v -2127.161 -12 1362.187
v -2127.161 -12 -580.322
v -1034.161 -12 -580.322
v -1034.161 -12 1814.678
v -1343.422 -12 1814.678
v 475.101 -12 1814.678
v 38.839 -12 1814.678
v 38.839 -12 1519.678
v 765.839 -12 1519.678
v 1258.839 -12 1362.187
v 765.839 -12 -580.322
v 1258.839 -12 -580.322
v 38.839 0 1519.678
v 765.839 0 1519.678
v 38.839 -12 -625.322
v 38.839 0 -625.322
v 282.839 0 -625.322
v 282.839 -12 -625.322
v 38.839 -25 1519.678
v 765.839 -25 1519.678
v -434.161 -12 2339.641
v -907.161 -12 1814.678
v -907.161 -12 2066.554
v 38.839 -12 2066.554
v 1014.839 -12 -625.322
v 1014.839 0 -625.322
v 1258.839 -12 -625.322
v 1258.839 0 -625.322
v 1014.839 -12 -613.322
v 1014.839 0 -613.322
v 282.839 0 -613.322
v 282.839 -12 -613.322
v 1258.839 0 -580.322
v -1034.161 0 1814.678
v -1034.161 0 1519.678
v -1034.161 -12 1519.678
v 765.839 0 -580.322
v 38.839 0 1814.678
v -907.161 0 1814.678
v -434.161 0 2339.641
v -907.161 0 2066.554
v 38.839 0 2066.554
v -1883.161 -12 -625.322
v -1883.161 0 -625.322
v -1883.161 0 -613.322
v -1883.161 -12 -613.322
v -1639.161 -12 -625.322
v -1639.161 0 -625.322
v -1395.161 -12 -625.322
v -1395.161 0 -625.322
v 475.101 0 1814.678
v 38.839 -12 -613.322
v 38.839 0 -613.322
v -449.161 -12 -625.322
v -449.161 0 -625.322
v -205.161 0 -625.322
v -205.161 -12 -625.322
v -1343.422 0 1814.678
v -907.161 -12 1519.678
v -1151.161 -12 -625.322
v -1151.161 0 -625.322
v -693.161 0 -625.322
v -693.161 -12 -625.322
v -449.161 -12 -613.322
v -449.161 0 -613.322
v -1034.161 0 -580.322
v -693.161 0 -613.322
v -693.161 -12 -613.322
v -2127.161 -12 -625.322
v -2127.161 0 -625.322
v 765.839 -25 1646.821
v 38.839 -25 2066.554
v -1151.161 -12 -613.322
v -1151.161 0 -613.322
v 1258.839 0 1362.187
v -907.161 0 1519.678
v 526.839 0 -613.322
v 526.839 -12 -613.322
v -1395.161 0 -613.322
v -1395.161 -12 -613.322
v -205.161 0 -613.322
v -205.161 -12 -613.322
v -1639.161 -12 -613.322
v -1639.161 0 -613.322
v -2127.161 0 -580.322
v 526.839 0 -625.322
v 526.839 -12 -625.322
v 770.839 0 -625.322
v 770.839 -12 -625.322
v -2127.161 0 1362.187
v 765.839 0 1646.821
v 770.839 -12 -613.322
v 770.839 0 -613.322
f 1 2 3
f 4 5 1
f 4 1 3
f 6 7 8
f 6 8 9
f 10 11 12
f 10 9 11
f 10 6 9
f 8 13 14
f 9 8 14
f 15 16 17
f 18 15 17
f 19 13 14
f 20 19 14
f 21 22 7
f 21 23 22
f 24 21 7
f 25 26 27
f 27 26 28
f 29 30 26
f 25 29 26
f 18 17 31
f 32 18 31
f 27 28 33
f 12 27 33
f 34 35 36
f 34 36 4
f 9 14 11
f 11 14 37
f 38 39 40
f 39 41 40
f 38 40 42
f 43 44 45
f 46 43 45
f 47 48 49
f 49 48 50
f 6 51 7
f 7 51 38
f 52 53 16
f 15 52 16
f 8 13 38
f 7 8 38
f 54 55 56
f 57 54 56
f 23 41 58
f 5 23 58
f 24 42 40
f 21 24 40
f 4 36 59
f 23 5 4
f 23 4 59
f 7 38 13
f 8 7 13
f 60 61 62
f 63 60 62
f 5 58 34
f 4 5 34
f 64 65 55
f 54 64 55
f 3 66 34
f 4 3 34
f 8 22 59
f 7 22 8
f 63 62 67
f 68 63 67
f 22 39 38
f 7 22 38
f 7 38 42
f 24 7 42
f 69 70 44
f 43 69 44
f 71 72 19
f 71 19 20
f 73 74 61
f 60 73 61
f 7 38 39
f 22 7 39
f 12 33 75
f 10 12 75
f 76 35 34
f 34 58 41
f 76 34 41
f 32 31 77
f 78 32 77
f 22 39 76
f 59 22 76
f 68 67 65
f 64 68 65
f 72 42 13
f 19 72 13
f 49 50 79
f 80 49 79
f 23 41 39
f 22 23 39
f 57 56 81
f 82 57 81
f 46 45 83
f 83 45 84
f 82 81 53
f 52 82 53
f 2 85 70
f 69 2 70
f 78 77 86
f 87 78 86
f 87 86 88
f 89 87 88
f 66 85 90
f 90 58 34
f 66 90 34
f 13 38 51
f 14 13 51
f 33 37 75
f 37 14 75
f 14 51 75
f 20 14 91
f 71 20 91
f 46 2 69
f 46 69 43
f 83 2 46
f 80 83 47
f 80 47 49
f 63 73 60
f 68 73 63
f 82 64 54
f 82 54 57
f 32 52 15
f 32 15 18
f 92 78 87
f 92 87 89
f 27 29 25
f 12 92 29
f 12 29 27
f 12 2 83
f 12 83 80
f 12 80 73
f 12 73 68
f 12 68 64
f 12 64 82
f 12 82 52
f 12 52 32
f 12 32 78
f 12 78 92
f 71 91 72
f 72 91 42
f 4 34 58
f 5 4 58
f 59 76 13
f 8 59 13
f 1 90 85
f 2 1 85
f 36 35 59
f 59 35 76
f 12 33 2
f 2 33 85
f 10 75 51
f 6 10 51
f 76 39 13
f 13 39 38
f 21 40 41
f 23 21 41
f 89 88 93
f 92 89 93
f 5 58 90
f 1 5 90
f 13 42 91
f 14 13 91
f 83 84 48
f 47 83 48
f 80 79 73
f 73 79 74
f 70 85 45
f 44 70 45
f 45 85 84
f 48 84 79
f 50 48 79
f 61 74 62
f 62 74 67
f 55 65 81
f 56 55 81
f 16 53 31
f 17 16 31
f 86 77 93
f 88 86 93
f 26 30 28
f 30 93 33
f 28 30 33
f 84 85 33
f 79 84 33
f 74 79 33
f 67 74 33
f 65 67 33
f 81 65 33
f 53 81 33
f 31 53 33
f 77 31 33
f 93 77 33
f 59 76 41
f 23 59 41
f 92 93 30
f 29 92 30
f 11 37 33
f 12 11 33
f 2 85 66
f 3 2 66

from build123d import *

# Parameters (mm, degrees)
F1_DEPTH = 12
F2_DEPTH = 12
F3_DEPTH = 12
F4_DEPTH = 12
F0_W     = 127
F0_H     = 295
F5_DEPTH = 12
F6_DEPTH = 25
F7_DEPTH = 12


with BuildPart() as f1:
    # F0 (on Front) → F1 (new body)
    with BuildSketch(Plane.XZ):
        Polygon((-2127.1608864989, -580.3215209696), (-1034.1608864989, -580.3215209696), (-1034.1608864989, 1519.6784790304), (-1034.1608864989, 1814.6784790304), (-1343.4224964989, 1814.6784790304), (-2127.1608864989, 1362.1869085897), align=None)
    extrude(amount=F1_DEPTH)


with BuildPart() as f2:
    # F0 (on Front) → F2 (new body)
    with BuildSketch(Plane.XZ):
        Polygon((765.8391135011, 1519.6784790304), (765.8391135011, -580.3215209696), (1258.8391135011, -580.3215209696), (1258.8391135011, 1362.1869085897), (765.8391135011, 1646.8205913001), align=None)
        Polygon((38.8391135011, 1814.6784790304), (38.8391135011, 1519.6784790304), (765.8391135011, 1519.6784790304), (765.8391135011, 1646.8205913001), (475.1007235011, 1814.6784790304), align=None)
    extrude(amount=F2_DEPTH)


with BuildPart() as f3:
    # F0 (on Front) → F3 (new body)
    with BuildSketch(Plane.XZ):
        Polygon((-907.1608864989, 1814.6784790304), (38.8391135011, 1814.6784790304), (38.8391135011, 2066.554237001), (-434.1608864989, 2339.6409143277), (-907.1608864989, 2066.554237001), align=None)
    extrude(amount=F3_DEPTH)


with BuildPart() as f4:
    # F0 (on Front) → F4 (new body)
    with BuildSketch(Plane.XZ):
        Polygon((-434.1608864989, 1519.6784790304), (38.8391135011, 1519.6784790304), (38.8391135011, 1814.6784790304), (-907.1608864989, 1814.6784790304), (-907.1608864989, 1519.6784790304), align=None)
    extrude(amount=F4_DEPTH)


with BuildPart() as f5:
    # F0 (on Front) → F5 (new body)
    with BuildSketch(Plane.XZ):
        Polygon((-1034.1608864989, 1814.6784790304), (-907.1608864989, 1814.6784790304), (-907.1608864989, 2066.554237001), (-1343.4224964989, 1814.6784790304), align=None)
        with Locations((-970.6608864989, 1667.1784790304)):
            Rectangle(F0_W, F0_H)
    extrude(amount=F5_DEPTH)


with BuildPart() as f6:
    # F0 (on Front) → F6 (new body)
    with BuildSketch(Plane.XZ):
        Polygon((38.8391135011, 2066.554237001), (38.8391135011, 1814.6784790304), (475.1007235011, 1814.6784790304), align=None)
        Polygon((38.8391135011, 1814.6784790304), (38.8391135011, 1519.6784790304), (765.8391135011, 1519.6784790304), (765.8391135011, 1646.8205913001), (475.1007235011, 1814.6784790304), align=None)
    extrude(amount=F6_DEPTH)


with BuildPart() as f7:
    # F0 (on Front) → F7 (new body)
    with BuildSketch(Plane.XZ):
        Polygon((-907.1608864989, -625.3215209696), (-907.1608864989, -580.3215209696), (-1034.1608864989, -580.3215209696), (-2127.1608864989, -580.3215209696), (-2127.1608864989, -625.3215209696), (-1883.1608864989, -625.3215209696), (-1883.1608864989, -613.3215209696), (-1639.1608864989, -613.3215209696), (-1639.1608864989, -625.3215209696), (-1395.1608864989, -625.3215209696), (-1395.1608864989, -613.3215209696), (-1151.1608864989, -613.3215209696), (-1151.1608864989, -625.3215209696), align=None)
        Polygon((-205.1608864989, -613.3215209696), (38.8391135011, -613.3215209696), (38.8391135011, -580.3215209696), (-907.1608864989, -580.3215209696), (-907.1608864989, -625.3215209696), (-693.1608864989, -625.3215209696), (-693.1608864989, -613.3215209696), (-449.1608864989, -613.3215209696), (-449.1608864989, -625.3215209696), (-205.1608864989, -625.3215209696), align=None)
        Polygon((38.8391135011, -613.3215209696), (38.8391135011, -625.3215209696), (282.8391135011, -625.3215209696), (282.8391135011, -613.3215209696), (526.8391135011, -613.3215209696), (526.8391135011, -625.3215209696), (770.8391135011, -625.3215209696), (770.8391135011, -613.3215209696), (1014.8391135011, -613.3215209696), (1014.8391135011, -625.3215209696), (1258.8391135011, -625.3215209696), (1258.8391135011, -580.3215209696), (765.8391135011, -580.3215209696), (38.8391135011, -580.3215209696), align=None)
    extrude(amount=F7_DEPTH)


solid = Compound([f1.part, f2.part, f3.part, f4.part, f5.part, f6.part, f7.part])
